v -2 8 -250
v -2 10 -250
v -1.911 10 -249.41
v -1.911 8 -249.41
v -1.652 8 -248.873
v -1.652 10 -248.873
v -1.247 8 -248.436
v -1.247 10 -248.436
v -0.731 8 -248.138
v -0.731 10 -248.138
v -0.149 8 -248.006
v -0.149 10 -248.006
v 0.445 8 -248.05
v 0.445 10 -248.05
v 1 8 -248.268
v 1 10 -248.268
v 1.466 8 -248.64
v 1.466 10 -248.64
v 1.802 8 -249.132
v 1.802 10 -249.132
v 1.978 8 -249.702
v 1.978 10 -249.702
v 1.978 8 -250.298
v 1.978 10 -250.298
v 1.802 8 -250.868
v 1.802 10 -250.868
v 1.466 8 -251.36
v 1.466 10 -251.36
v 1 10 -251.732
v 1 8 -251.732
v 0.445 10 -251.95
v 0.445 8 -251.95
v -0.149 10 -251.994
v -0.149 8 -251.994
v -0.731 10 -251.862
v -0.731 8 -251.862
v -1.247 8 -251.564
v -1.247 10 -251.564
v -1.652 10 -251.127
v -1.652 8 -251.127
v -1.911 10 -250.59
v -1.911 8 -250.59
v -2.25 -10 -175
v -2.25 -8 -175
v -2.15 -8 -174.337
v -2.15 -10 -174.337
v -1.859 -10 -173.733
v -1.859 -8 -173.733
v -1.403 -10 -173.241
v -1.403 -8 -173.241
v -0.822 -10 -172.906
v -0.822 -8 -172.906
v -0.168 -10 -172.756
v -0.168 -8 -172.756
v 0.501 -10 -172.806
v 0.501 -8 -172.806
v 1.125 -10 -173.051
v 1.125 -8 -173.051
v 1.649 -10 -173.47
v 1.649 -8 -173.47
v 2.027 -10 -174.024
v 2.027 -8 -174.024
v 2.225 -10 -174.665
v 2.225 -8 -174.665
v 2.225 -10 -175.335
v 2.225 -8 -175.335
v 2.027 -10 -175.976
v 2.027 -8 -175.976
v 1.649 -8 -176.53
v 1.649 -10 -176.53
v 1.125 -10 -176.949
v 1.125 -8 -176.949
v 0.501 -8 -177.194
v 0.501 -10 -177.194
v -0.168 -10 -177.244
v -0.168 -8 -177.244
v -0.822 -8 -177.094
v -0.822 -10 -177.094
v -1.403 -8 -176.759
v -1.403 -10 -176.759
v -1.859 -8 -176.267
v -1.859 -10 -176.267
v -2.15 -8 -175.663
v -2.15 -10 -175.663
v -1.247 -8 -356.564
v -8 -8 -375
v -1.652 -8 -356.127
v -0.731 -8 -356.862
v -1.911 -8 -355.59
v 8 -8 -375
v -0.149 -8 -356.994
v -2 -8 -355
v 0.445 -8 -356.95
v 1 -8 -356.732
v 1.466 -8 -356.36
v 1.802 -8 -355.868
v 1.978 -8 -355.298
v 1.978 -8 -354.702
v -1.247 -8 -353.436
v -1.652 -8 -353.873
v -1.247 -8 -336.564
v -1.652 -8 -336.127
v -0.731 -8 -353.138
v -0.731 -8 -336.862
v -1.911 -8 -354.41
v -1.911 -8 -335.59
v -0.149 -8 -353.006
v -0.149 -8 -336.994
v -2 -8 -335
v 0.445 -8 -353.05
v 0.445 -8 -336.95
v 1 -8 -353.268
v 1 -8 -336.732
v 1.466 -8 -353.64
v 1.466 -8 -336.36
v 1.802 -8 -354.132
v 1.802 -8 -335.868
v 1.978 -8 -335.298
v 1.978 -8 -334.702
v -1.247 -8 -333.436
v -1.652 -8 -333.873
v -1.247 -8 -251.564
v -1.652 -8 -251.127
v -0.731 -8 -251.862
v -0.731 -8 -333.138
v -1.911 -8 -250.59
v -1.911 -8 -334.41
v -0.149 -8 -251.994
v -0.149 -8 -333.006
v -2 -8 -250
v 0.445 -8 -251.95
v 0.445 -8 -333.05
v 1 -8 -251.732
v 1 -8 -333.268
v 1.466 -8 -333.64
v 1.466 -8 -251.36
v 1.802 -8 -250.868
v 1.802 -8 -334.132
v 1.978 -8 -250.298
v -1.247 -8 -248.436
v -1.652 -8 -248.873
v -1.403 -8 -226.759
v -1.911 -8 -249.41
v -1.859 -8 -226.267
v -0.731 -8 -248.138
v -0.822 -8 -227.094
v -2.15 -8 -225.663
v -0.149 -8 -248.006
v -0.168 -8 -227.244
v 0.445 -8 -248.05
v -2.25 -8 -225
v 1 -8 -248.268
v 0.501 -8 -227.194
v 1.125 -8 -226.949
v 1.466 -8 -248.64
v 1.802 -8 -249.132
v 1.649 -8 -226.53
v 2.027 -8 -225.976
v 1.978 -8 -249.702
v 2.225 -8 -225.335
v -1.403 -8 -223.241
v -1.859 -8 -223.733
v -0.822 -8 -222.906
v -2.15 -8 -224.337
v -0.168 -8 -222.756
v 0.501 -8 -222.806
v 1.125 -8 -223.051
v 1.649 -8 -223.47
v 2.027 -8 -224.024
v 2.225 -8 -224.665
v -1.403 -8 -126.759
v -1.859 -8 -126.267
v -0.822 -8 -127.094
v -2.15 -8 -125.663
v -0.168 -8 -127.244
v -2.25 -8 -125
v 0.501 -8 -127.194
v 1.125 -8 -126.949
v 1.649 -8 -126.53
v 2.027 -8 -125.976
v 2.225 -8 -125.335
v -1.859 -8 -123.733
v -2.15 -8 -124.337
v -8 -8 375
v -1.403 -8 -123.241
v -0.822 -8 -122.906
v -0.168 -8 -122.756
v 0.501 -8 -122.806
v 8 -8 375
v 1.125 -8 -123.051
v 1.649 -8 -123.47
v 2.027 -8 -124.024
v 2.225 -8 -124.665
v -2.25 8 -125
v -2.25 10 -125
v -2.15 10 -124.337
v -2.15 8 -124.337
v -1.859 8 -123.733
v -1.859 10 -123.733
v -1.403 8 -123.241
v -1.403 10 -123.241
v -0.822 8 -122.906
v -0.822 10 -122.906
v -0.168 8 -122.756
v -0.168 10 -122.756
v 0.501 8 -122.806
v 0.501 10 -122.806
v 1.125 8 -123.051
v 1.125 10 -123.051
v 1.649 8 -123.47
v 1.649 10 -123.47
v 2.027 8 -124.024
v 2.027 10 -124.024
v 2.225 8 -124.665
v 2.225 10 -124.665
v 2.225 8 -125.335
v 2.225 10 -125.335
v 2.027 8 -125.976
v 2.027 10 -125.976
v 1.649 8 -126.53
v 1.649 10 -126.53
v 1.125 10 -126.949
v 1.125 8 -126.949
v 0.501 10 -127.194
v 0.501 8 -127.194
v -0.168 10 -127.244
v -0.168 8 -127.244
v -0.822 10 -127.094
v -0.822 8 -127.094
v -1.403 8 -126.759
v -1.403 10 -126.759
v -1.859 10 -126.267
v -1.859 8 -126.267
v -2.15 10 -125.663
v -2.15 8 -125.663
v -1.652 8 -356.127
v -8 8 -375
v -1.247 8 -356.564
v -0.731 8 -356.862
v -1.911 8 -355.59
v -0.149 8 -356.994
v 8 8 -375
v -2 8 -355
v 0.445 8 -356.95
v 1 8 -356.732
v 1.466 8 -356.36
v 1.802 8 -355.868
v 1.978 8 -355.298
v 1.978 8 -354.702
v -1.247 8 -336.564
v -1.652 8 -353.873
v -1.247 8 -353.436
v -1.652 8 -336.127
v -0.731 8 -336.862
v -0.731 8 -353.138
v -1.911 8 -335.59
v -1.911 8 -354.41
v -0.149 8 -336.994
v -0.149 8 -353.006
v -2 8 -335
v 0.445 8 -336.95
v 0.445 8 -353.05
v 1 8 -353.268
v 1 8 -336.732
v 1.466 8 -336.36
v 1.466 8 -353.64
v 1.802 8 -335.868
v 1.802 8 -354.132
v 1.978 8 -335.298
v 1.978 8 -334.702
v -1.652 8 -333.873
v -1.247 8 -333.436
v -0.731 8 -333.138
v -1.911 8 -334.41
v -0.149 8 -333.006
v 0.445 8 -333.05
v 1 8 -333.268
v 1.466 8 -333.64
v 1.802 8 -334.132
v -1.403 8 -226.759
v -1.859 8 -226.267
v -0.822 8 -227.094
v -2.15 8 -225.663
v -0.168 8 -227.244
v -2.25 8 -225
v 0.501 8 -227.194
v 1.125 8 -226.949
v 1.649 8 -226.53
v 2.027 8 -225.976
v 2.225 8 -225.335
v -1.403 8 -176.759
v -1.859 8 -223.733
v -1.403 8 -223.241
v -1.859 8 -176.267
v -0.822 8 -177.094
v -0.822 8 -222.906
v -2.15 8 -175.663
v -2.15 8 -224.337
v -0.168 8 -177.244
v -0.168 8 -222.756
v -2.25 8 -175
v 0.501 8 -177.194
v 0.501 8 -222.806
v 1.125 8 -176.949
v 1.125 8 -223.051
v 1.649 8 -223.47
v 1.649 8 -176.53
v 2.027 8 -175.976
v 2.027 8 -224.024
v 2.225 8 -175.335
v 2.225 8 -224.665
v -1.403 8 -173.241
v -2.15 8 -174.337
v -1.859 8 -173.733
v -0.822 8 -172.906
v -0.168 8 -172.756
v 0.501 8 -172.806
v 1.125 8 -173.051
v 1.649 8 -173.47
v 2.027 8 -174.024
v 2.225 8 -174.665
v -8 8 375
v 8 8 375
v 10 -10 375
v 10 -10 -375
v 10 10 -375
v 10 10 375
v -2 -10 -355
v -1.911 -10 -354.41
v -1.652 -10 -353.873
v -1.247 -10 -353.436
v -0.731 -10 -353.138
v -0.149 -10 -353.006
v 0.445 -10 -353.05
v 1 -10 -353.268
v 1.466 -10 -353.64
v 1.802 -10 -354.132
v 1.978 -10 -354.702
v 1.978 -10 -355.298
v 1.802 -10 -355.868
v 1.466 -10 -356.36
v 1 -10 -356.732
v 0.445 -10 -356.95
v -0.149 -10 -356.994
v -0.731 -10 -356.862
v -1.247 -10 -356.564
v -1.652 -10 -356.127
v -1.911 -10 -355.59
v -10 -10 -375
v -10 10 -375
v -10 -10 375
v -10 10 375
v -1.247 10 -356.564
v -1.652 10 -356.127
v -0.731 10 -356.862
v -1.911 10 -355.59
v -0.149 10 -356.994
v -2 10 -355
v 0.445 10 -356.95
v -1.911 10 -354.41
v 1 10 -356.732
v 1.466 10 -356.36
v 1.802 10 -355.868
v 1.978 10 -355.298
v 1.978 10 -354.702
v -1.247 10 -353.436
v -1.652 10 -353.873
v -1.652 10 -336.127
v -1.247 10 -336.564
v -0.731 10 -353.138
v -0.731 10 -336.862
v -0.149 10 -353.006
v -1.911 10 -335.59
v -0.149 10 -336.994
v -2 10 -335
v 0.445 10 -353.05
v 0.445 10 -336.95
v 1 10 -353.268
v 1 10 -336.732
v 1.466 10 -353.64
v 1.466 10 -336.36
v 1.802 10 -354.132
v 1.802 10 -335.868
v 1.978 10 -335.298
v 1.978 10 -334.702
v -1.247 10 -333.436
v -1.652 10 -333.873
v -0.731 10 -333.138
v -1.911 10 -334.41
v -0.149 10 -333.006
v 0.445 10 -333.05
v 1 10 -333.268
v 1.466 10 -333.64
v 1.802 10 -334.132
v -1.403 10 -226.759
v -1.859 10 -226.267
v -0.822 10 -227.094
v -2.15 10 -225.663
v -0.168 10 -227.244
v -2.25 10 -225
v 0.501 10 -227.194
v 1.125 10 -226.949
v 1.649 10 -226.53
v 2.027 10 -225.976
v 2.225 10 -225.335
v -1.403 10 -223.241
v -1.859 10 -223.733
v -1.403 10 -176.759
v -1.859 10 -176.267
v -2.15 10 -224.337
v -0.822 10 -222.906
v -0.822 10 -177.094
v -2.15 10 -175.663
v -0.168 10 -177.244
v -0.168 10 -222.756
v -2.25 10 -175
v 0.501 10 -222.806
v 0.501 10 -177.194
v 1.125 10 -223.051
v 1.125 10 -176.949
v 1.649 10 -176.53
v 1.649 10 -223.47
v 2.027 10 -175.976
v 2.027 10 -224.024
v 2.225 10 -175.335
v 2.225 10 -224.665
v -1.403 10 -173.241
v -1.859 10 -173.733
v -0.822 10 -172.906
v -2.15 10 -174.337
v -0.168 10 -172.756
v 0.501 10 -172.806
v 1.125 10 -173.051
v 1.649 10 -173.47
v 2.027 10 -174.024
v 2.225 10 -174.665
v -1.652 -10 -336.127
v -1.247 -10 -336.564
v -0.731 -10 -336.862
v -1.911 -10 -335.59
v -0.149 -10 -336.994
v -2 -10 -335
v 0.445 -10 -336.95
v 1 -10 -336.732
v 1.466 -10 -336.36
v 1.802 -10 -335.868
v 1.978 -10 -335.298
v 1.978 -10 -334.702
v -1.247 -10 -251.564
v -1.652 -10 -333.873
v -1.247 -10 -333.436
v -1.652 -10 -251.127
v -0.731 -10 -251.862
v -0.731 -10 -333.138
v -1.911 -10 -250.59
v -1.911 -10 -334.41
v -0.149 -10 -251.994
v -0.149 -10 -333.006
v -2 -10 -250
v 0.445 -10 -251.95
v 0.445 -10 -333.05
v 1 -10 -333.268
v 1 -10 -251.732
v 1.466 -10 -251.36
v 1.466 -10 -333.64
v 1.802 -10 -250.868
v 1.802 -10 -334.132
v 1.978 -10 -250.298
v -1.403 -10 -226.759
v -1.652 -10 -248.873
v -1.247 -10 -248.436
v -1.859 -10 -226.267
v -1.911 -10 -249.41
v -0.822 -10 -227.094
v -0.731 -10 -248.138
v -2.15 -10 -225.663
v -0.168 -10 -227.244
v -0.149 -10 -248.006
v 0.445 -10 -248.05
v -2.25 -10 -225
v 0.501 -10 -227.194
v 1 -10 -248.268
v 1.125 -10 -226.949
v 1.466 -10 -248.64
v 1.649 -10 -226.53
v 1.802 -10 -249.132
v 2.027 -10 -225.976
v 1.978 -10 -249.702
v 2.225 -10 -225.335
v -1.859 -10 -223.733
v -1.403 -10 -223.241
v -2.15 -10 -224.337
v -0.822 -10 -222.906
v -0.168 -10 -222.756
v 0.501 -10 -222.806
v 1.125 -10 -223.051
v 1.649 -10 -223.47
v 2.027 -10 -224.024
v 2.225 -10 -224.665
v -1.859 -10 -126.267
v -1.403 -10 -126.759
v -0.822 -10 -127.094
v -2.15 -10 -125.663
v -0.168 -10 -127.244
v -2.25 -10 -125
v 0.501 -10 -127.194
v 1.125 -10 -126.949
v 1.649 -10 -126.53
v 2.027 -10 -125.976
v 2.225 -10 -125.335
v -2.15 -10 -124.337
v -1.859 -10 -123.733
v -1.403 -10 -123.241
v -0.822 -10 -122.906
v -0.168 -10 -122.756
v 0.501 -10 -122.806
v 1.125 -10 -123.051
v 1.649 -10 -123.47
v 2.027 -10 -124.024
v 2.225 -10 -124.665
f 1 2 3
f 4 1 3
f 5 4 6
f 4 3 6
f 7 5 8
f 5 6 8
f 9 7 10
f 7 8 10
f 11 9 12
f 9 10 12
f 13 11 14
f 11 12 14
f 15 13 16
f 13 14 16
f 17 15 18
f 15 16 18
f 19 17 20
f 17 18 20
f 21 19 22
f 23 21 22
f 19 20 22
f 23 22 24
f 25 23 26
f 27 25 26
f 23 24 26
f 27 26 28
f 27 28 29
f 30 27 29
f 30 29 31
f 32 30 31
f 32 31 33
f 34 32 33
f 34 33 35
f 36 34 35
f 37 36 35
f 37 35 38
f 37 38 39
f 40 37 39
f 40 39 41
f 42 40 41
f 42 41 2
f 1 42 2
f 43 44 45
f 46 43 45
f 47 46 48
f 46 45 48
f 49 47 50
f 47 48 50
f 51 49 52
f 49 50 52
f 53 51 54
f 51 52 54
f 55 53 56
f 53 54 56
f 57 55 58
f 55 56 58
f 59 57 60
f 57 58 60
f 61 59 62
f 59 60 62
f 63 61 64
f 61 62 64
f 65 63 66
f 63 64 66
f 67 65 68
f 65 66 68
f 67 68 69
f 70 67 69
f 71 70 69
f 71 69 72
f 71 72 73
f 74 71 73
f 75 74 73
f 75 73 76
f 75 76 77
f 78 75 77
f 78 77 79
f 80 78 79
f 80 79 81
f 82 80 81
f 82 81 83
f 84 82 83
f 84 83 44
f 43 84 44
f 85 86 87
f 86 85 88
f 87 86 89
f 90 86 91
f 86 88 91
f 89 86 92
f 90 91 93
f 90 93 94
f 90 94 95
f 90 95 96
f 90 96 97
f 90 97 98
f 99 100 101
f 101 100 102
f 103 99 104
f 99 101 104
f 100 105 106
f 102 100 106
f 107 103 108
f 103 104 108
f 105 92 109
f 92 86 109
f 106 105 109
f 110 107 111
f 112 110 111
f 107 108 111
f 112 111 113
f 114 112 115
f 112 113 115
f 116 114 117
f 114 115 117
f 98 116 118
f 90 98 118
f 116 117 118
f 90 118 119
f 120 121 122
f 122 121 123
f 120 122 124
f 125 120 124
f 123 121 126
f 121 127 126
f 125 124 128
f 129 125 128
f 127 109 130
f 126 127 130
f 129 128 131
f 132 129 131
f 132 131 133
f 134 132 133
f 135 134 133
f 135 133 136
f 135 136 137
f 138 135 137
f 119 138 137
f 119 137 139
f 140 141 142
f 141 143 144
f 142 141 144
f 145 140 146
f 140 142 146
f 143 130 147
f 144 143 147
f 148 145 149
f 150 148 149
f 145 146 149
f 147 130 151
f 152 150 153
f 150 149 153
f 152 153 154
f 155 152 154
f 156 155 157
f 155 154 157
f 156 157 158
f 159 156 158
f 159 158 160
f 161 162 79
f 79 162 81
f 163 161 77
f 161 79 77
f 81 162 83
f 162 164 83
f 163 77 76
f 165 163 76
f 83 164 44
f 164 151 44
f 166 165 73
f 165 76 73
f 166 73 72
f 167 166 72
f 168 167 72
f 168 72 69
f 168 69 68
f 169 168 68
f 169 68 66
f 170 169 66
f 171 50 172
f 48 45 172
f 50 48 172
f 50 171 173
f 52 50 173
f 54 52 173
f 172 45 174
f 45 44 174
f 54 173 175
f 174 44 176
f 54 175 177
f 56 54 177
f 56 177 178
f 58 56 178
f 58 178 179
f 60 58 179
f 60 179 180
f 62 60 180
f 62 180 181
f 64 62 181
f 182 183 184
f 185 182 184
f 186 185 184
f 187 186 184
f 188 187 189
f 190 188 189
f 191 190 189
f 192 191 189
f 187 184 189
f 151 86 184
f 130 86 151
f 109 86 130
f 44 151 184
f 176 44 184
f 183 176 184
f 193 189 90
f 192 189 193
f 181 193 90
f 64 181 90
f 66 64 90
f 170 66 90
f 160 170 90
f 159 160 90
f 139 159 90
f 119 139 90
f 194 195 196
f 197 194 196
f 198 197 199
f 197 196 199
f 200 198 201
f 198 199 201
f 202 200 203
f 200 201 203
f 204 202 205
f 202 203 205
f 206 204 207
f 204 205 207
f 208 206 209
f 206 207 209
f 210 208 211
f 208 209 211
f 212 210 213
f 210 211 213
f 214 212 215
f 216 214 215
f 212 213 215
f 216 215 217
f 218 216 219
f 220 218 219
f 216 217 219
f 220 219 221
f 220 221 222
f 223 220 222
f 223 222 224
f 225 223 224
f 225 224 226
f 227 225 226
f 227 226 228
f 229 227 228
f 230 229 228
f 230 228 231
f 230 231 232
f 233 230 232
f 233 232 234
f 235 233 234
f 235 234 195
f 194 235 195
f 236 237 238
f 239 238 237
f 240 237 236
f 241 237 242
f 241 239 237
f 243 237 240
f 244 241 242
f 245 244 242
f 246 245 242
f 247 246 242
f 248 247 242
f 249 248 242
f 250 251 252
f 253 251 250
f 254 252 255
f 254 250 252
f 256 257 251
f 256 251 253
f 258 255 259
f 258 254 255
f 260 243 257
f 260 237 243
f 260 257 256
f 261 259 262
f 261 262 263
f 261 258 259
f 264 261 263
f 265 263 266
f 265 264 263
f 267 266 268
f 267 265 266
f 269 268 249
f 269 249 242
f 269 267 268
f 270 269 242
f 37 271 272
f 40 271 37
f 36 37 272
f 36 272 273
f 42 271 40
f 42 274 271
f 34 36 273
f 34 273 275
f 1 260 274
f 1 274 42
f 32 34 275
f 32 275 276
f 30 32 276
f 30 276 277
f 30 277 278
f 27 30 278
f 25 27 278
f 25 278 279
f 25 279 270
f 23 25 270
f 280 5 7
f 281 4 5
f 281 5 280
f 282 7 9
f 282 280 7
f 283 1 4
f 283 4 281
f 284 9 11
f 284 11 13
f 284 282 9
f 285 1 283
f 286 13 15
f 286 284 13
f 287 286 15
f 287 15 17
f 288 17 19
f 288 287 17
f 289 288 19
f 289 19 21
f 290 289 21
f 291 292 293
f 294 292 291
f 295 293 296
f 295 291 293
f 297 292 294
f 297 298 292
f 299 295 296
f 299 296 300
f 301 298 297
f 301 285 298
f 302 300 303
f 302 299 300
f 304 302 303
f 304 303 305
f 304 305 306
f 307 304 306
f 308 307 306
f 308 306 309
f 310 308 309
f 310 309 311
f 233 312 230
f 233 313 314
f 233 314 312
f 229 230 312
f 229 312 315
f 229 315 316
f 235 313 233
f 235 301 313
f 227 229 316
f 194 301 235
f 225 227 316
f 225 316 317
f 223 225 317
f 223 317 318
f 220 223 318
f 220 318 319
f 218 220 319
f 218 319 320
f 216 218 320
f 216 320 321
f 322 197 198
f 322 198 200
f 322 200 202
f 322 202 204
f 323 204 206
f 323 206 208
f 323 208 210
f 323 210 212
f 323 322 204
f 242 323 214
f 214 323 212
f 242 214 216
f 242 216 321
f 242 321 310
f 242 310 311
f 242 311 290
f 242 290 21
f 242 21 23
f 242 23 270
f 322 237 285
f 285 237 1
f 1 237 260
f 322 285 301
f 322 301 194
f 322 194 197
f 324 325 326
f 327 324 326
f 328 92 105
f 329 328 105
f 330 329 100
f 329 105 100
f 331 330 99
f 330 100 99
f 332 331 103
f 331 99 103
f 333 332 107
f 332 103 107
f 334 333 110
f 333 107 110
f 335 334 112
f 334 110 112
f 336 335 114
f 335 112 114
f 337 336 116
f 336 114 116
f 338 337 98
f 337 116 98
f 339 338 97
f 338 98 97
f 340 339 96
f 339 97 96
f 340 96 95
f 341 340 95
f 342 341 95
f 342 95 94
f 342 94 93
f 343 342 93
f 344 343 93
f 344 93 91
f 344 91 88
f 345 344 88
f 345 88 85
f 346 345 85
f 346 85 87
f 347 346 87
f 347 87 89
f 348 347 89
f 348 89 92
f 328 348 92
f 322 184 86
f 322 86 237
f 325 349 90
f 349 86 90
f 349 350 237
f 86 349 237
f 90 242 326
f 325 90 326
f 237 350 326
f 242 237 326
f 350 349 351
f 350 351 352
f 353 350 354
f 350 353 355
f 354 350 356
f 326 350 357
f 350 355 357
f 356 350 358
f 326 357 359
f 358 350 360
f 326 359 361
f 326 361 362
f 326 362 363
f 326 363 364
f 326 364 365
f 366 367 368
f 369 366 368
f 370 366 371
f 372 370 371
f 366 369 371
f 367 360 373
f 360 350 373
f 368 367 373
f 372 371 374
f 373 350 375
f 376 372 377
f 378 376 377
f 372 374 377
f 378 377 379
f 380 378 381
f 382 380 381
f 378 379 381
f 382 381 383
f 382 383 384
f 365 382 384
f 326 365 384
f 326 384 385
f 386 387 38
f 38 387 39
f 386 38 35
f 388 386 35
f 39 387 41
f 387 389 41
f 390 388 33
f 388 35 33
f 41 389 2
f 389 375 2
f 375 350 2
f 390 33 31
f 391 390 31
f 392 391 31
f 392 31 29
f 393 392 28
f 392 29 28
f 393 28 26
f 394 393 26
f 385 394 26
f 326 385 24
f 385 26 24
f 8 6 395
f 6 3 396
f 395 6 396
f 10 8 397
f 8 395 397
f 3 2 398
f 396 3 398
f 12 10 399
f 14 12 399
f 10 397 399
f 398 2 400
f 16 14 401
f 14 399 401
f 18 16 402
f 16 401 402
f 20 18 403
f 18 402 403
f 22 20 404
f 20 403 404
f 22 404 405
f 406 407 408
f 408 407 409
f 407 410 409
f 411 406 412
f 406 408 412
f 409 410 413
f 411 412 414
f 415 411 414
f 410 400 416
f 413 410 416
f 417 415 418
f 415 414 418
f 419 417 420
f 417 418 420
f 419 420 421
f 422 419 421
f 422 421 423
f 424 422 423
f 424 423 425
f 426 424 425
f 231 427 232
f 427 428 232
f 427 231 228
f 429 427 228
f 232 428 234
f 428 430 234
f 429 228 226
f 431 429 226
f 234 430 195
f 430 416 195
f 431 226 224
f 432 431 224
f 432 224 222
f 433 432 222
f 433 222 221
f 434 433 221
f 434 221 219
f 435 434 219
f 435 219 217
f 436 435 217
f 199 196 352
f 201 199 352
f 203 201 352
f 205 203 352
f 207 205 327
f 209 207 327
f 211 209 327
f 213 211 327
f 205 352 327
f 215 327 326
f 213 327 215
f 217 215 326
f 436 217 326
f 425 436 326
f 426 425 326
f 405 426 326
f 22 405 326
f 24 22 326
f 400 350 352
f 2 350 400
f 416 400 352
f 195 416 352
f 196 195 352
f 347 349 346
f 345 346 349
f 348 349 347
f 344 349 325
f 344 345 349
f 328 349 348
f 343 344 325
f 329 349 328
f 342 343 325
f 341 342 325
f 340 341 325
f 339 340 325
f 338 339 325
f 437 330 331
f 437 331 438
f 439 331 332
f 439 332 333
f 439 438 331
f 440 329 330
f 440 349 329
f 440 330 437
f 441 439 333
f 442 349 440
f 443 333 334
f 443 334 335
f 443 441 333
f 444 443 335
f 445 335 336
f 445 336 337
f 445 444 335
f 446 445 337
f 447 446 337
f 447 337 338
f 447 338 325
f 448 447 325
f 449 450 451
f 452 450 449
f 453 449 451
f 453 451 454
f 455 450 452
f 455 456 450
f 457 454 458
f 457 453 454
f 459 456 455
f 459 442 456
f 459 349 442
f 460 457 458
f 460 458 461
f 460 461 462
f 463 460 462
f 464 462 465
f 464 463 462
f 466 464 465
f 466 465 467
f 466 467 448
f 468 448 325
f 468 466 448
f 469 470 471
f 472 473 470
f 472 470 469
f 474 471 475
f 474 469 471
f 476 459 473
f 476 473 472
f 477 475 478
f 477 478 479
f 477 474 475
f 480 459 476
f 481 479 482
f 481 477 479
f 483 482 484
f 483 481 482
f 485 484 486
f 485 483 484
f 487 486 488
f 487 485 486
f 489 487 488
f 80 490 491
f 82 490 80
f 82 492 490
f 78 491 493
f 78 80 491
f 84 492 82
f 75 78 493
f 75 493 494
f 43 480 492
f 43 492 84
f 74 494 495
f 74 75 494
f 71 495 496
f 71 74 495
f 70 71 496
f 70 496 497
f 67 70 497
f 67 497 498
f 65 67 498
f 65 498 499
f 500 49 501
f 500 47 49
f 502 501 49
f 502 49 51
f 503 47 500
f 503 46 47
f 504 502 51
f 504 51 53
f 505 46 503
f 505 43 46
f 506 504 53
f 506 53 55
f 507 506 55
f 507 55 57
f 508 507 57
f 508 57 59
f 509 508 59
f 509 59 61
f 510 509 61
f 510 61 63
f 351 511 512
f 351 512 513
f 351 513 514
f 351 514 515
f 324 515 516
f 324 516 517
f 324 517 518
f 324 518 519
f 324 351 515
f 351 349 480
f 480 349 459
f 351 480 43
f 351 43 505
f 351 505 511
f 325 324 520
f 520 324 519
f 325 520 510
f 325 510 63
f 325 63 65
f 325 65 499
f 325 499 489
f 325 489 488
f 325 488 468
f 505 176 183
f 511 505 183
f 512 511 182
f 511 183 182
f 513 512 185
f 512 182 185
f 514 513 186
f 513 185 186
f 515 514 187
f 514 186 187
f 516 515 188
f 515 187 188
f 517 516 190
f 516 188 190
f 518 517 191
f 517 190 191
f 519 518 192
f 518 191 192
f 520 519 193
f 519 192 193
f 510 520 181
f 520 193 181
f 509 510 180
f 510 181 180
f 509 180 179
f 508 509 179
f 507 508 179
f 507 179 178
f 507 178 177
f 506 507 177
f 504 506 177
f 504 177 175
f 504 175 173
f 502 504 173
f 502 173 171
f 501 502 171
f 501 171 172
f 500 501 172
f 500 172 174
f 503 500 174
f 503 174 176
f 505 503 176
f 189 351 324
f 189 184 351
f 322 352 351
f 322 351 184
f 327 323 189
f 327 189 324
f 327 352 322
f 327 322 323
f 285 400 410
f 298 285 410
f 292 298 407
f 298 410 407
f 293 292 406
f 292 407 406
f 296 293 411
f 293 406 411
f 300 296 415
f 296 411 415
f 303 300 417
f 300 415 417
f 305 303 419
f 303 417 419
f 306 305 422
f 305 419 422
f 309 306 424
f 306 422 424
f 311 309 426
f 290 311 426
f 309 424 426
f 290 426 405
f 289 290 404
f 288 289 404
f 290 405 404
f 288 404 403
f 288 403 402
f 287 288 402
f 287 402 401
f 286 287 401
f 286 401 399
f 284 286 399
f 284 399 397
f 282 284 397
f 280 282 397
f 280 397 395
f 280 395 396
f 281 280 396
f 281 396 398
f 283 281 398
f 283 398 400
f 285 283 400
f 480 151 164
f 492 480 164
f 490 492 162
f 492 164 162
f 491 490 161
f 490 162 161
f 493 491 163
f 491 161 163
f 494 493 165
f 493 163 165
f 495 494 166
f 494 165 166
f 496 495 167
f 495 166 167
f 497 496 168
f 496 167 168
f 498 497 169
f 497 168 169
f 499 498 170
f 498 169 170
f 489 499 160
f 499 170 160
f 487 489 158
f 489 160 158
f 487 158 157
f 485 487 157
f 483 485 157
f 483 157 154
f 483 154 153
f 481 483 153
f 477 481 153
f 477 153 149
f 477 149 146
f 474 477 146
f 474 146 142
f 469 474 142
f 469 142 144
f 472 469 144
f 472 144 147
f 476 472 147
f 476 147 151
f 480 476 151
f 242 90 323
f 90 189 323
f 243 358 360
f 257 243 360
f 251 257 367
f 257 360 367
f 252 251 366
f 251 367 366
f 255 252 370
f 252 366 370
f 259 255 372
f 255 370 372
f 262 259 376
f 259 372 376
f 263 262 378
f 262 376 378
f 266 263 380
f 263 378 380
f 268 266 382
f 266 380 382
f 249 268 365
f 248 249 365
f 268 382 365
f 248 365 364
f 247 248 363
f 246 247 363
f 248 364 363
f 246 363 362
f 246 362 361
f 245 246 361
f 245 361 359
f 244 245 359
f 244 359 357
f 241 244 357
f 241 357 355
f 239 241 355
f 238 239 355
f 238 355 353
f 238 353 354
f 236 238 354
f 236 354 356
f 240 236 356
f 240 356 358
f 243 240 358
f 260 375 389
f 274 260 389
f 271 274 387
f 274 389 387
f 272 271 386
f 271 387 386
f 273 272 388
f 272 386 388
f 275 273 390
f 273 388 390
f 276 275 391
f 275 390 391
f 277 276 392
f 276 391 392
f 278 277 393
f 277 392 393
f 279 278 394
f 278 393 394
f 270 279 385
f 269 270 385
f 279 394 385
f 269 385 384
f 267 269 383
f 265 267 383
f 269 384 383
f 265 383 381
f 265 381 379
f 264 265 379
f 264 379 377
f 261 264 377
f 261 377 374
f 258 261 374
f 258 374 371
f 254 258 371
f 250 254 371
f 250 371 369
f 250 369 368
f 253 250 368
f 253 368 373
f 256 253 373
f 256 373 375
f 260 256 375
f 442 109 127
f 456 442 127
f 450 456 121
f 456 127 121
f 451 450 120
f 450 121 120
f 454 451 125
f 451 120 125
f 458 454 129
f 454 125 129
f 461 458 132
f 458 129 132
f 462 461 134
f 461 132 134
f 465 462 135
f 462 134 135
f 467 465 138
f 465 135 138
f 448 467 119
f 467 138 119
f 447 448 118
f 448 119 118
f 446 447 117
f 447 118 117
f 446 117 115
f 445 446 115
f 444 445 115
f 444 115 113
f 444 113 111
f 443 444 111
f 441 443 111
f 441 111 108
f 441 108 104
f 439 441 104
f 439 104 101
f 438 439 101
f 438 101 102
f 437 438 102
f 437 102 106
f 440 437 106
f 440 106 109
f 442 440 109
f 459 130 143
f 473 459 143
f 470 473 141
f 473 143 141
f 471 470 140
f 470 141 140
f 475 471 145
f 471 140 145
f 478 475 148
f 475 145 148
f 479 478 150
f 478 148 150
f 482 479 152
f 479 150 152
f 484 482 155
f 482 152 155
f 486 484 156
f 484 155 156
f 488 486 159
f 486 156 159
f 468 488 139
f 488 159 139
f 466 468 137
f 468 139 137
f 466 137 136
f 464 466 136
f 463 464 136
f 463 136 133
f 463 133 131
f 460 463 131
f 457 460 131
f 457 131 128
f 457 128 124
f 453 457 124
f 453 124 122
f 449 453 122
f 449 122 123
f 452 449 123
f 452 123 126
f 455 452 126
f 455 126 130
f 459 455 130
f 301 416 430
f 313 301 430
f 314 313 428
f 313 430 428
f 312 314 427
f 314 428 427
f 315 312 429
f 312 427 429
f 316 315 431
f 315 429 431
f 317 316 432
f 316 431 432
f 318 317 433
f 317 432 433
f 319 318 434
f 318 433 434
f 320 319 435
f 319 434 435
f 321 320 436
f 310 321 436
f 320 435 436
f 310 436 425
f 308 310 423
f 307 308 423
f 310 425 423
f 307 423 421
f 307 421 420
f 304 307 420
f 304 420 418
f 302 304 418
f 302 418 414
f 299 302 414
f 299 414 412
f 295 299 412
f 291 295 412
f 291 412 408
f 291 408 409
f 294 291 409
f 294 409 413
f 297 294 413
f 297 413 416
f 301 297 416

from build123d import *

# Parameters (mm, degrees)
SKETCH_1_W          = 20
SKETCH_1_H          = 20
SKETCH_1_W_2        = 16
SKETCH_1_H_2        = 16
EXTRUDE_1_DEPTH     = 375
SKETCH_2_R          = 2
CUT_EXTRUDE_1_DEPTH = 376.666075125
SKETCH_3_R          = 2.25
CUT_EXTRUDE_2_DEPTH = 376.666075125


with BuildPart() as part:
    # 草图1 → 凸台-拉伸1 (new, symmetric)
    with BuildSketch(Plane.XY):
        Rectangle(SKETCH_1_W, SKETCH_1_H)
        Rectangle(SKETCH_1_W_2, SKETCH_1_H_2, mode=Mode.SUBTRACT)
    extrude(amount=EXTRUDE_1_DEPTH, both=True)

    # 草图2 → 切除-拉伸1 (cut, through all)
    with BuildSketch(Plane(origin=(0, 10, 0), x_dir=(1, 0, 0), z_dir=(0, 1, 0))):
        with Locations((0, 385)):
            Circle(SKETCH_2_R)
        with Locations(Location((0, 355, 0), (0, 0, 180))):
            Circle(SKETCH_2_R)
        with Locations(Location((0, 250, 0), (0, 0, 180))):
            Circle(SKETCH_2_R)
        with Locations(Location((0, 335, 0), (0, 0, 180))):
            Circle(SKETCH_2_R)
    extrude(amount=-CUT_EXTRUDE_1_DEPTH, mode=Mode.SUBTRACT)

    # 草图3 → 切除-拉伸2 (cut, through all)
    with BuildSketch(Plane(origin=(0, 10, 0), x_dir=(1, 0, 0), z_dir=(0, 1, 0))):
        with Locations(Location((0, 125, 0), (0, 0, 180))):
            Circle(SKETCH_3_R)
        with Locations(Location((0, 175, 0), (0, 0, 180))):
            Circle(SKETCH_3_R)
        with Locations(Location((0, 225, 0), (0, 0, 180))):
            Circle(SKETCH_3_R)
    extrude(amount=-CUT_EXTRUDE_2_DEPTH, mode=Mode.SUBTRACT)


solid = part.part
